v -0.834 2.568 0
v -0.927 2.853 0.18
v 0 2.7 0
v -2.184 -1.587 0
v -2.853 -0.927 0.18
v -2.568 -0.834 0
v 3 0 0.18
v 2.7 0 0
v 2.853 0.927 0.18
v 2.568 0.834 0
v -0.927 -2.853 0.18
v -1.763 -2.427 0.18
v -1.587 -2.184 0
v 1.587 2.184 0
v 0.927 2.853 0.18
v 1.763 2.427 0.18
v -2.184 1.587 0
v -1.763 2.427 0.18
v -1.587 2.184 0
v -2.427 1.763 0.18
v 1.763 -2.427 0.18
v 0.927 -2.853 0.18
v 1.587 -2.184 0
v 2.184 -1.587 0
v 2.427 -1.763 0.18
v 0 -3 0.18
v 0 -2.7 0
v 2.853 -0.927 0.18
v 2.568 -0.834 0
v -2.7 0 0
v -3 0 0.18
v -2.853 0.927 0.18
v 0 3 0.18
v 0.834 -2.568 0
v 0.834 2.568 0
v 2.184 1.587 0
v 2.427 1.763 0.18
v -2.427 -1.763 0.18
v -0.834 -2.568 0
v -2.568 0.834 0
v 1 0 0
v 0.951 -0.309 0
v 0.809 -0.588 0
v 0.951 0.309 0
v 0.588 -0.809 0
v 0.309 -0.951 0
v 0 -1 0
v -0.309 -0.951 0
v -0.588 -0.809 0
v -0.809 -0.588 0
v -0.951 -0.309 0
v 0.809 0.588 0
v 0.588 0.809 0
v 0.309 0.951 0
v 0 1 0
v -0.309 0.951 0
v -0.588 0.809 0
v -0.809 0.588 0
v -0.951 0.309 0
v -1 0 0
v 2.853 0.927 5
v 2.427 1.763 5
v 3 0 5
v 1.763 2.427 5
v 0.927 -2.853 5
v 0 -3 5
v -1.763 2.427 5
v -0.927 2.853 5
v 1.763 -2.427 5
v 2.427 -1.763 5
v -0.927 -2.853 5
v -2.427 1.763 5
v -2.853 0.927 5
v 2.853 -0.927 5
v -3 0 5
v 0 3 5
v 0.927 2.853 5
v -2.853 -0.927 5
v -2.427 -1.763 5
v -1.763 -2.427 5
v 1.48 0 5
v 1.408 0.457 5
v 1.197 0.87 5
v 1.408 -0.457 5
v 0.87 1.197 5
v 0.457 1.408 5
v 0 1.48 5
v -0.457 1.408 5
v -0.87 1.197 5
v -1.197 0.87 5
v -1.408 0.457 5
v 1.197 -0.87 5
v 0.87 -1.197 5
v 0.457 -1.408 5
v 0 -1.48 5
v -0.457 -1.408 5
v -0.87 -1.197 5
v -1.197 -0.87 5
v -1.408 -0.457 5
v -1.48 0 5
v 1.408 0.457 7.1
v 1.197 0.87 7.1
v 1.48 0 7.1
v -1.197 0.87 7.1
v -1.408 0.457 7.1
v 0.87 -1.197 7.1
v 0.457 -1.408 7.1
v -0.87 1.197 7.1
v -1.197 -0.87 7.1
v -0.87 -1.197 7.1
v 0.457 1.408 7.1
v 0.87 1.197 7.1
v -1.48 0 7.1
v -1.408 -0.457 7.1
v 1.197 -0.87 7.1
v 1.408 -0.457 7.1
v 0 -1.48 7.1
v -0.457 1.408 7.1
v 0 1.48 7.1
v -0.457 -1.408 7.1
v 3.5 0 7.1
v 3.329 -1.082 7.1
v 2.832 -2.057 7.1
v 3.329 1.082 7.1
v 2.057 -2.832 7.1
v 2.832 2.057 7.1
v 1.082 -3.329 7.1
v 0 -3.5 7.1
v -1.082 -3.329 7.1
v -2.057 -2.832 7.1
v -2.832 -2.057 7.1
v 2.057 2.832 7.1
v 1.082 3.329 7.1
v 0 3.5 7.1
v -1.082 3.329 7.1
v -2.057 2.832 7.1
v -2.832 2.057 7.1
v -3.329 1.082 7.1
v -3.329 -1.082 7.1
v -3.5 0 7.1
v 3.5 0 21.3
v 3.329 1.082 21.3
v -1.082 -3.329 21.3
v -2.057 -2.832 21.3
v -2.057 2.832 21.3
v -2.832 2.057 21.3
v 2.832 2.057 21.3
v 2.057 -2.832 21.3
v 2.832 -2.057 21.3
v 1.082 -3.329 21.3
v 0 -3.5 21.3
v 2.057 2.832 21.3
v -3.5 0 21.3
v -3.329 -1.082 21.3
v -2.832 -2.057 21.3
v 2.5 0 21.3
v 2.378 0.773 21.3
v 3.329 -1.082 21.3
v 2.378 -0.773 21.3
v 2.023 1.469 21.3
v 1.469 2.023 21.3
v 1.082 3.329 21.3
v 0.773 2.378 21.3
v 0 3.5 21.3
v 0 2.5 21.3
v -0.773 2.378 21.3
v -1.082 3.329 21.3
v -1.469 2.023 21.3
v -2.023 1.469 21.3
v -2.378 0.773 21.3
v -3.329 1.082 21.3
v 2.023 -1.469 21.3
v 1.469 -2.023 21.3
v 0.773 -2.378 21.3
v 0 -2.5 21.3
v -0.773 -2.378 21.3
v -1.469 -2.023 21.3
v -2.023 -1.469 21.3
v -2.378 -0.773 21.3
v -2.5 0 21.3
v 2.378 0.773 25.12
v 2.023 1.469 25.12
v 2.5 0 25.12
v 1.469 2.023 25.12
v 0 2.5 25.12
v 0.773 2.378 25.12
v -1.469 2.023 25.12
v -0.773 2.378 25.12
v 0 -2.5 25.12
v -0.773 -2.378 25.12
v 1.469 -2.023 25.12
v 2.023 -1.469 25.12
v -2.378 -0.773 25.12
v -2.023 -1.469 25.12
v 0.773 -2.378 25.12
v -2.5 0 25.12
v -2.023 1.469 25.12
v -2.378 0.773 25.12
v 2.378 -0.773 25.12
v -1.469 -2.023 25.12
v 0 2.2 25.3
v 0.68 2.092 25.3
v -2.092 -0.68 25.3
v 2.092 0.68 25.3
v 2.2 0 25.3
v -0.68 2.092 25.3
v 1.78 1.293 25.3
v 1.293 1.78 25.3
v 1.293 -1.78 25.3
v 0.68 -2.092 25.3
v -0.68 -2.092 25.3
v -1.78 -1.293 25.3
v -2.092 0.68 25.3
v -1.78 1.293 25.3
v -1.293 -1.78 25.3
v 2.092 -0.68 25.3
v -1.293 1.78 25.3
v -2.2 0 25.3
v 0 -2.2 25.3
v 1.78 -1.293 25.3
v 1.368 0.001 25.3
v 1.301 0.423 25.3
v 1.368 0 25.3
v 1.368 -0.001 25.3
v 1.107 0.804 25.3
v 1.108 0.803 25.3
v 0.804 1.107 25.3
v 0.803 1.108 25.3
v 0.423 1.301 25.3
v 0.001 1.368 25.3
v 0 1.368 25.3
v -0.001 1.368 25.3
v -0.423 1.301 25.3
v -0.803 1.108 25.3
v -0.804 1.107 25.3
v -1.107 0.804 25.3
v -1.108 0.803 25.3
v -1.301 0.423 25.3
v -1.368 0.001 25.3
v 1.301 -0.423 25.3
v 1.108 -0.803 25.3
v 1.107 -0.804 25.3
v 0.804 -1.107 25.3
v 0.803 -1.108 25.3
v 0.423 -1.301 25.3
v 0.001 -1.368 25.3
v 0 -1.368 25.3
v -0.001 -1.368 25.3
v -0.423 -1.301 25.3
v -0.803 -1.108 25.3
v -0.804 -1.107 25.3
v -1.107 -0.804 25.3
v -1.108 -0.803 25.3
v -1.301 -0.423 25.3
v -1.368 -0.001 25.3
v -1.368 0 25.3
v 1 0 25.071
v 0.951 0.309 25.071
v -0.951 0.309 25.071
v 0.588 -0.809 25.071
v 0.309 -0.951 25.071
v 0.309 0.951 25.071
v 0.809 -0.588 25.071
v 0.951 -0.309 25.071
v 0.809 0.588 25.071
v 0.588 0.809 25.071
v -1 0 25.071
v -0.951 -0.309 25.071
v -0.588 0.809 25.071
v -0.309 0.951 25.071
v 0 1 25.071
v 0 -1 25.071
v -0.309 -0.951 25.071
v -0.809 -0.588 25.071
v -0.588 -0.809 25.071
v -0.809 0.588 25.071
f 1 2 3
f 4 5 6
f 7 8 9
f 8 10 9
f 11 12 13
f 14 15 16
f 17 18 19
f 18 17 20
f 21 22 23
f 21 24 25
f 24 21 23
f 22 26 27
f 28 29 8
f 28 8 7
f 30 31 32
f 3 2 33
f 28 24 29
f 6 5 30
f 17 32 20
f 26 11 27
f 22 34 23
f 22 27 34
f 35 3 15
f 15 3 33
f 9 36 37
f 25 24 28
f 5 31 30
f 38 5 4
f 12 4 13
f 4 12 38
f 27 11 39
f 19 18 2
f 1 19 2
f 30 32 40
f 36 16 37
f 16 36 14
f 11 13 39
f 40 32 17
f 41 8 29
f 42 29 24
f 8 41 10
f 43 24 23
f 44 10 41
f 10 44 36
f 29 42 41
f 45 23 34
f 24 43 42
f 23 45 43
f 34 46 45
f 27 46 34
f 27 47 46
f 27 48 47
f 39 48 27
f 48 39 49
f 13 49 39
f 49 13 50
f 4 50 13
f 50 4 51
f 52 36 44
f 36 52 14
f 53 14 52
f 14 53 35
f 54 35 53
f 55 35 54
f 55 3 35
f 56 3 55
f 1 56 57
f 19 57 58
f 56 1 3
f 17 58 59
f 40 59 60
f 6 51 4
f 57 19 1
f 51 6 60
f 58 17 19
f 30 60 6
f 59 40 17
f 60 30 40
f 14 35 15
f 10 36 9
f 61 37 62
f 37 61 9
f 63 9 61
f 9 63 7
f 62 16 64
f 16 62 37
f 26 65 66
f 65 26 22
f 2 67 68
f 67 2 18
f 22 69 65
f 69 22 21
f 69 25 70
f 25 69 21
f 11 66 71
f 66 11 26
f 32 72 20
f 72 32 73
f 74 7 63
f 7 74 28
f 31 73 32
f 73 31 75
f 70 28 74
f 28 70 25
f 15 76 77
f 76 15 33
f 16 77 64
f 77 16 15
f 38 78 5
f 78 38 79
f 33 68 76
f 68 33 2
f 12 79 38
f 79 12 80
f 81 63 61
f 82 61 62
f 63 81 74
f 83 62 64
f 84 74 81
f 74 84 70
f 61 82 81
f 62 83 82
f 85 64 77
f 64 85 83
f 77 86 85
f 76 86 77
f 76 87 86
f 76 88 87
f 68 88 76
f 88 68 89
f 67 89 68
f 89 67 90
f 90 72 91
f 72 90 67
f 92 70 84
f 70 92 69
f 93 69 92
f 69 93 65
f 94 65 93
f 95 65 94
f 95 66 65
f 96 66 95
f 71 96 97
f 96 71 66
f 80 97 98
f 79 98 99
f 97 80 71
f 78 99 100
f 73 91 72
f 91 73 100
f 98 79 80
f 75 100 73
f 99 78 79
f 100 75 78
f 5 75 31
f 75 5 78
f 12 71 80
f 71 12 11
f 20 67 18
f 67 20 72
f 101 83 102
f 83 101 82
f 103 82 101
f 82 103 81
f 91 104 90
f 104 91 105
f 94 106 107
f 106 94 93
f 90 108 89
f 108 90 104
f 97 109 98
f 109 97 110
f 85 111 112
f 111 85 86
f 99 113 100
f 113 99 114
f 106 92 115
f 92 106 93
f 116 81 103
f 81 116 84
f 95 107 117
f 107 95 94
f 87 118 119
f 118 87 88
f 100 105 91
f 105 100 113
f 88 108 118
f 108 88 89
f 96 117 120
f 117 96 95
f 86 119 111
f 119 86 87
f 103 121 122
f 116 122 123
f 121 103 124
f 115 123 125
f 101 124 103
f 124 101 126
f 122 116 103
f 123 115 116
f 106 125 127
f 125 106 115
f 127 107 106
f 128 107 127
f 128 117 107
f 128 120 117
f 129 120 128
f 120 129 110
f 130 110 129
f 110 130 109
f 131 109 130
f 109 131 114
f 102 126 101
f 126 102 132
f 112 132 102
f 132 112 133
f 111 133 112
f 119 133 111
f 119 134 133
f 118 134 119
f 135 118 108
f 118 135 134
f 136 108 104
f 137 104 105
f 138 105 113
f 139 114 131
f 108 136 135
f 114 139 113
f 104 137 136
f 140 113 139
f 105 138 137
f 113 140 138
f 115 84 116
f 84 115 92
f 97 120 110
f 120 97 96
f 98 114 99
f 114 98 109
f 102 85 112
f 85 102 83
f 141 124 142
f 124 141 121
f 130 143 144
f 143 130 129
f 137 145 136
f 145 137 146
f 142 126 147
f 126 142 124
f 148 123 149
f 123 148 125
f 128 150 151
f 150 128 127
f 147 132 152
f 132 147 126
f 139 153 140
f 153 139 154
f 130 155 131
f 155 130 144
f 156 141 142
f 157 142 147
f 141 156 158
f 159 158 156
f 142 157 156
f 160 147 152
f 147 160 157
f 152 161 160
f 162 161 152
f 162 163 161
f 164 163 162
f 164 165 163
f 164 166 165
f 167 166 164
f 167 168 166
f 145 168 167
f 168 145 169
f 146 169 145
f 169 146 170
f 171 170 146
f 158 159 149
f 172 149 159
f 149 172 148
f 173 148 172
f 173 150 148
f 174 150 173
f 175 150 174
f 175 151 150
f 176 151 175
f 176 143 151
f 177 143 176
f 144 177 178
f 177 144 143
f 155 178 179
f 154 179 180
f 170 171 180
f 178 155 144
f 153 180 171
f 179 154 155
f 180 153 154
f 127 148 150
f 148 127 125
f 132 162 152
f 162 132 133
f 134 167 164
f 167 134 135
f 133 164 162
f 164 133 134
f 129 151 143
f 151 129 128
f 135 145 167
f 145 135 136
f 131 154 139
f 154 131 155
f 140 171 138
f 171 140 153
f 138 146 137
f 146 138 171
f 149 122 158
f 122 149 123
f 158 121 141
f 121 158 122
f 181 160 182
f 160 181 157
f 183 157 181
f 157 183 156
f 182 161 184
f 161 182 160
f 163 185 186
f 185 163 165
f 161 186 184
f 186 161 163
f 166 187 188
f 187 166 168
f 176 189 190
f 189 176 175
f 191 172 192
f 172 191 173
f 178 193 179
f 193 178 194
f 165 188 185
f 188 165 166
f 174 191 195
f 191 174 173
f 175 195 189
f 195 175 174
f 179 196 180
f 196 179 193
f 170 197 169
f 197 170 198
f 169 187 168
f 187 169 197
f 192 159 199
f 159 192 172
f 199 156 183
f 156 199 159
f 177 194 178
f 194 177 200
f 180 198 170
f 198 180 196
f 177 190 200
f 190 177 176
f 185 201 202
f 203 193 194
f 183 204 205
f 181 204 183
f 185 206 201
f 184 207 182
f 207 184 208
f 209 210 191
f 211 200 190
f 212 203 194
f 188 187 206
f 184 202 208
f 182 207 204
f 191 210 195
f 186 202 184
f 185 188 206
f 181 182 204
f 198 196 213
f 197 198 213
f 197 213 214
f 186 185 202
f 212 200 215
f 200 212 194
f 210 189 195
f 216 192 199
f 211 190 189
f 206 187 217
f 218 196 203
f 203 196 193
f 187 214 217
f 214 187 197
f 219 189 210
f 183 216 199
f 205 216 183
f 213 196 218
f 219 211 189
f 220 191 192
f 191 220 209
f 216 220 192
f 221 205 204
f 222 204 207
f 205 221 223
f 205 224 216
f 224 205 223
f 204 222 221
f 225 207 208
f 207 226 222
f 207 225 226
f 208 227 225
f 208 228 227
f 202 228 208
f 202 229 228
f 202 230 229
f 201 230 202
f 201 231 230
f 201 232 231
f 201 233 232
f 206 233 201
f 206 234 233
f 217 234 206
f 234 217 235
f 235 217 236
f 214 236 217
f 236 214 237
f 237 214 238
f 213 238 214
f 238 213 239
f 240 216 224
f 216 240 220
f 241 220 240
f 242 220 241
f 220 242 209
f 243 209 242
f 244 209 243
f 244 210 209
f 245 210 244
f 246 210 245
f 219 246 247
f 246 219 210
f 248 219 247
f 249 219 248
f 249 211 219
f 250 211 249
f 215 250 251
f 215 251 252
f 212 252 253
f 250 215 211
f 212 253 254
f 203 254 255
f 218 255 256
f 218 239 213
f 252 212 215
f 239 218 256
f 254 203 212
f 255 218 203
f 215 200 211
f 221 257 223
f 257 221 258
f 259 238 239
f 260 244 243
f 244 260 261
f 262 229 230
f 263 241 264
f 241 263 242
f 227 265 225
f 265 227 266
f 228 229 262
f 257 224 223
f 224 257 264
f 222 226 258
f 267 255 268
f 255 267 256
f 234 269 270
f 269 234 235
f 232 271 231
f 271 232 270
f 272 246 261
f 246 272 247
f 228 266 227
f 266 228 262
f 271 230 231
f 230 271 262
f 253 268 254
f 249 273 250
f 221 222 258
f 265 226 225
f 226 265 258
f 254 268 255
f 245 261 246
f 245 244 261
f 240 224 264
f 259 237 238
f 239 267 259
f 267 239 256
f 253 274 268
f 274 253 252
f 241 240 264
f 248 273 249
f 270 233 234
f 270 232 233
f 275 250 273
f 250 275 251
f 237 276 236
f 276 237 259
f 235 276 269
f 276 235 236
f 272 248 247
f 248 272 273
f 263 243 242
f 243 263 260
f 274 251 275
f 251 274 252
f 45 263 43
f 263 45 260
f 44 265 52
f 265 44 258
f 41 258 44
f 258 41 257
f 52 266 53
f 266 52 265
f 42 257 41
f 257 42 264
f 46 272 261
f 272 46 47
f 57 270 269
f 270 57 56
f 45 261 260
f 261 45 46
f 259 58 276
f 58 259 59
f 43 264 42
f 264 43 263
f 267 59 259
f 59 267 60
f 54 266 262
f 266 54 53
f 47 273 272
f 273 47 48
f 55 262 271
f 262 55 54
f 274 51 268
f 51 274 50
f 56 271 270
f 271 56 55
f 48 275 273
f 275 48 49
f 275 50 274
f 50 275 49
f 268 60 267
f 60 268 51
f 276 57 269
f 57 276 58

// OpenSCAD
$fn=20;

E3DV6();

fudge=0.1;

module E3DV6(){
  blockOffset=-13.5;
  nozzleOffset=-6;
  heatBreakOffset=-7;
  color("silver") V6HeatSink();
  color("silver") translate([0,0,blockOffset]) V6Block();
  color("gold") translate([0,0,blockOffset+nozzleOffset]) V6Nozzle();
  color("grey") translate([0,0,heatBreakOffset]) V6HeatBreak();
}

module V6HeatSink(){
  ovHght=42.7;
  
  difference(){
    body();
    translate([0,0,-fudge]){
     cylinder(d=6,h=15.1+fudge);
     cylinder(d=7,h=10+fudge);
     cylinder(d=4.2,h=ovHght+fudge*2);
    }
    translate([0,0,ovHght-6.5+fudge]) cylinder(d=8,h=6.5+fudge);
  }
  
  module body(){
    //fins
    cylinder(d=22.3,h=1);
    for (iz=[1:10])
      translate([0,0,iz*2.5]) cylinder(d=22,h=1);
    translate([0,0,11*2.5]) cylinder(d=16,h=1);
    
    //mount
    translate([0,0,ovHght-3.7]) cylinder(d=16,h=3.7);
    translate([0,0,ovHght-3.7-6]) cylinder(d=12,h=6);
    translate([0,0,ovHght-3.7-6-3]) cylinder(d=16,h=3);
    
    //core
    cylinder(d1=10,d2=8,h=30);
  }
}

*V6Block();
module V6Block(){
  dims=[23,16,11.5];
  blockOffset=[-dims.x+8,-8,0];
  translate(blockOffset) difference(){
    cube(dims);
    translate([dims.x-20.5,8,-fudge/2]) cylinder(d=3,h=dims.z+fudge);
    translate([dims.x-2,8,-fudge/2]) cylinder(d=3,h=5.75);
    translate([dims.x-8,8,-fudge/2]) cylinder(d=6,h=dims.z+fudge);
    translate([dims.x-14.5,-fudge/2,4]) rotate([-90,0,0]) cylinder(d=6,h=dims.y+fudge);
    translate([-fudge/2,-fudge/2,4-0.5]) cube([dims.x-14.5+fudge,dims.y+fudge,1]);
  }
}

*V6Nozzle();
module V6Nozzle(){
  //Nozzle for 1.75mm filament
  E=2.6; //top opening
  D=2.0;
  ovHght=12.5;
  translate([0,0,ovHght-6]) cylinder(d=6,h=6);
  translate([0,0,ovHght-7.5]) cylinder(d=5,h=1.5);
  translate([0,0,ovHght-10.5]) cylinder(d=7/0.866,h=3,$fn=6);
  cylinder(d1=1,d2=5,h=2);
}

!V6HeatBreak();
module V6HeatBreak(){
  chmfrOut=[0.3,0.18];
  chmfrIn=[0.37,0.23];
  cntrBore=2;
  
  
  difference() {
    union(){
      cylinder(d1=6-chmfrOut.x*2,d2=6,h=chmfrOut.y);
      translate([0,0,chmfrOut.y]) cylinder(d=6,h=5-chmfrOut.y); //M6
      translate([0,0,5]) cylinder(d=cntrBore+0.48*2,h=2.1);
      translate([0,0,5+2.1]) cylinder(d=7,h=14.2); //M7
      translate([0,0,5+2.1+14.2]) cylinder(d=5,h=4-chmfrOut.y); //M6
      translate([0,0,5+2.1+14.2+4-chmfrOut.y]) 
        cylinder(d1=5,d2=5-chmfrOut.x*2,h=chmfrOut.y);
    }
    translate([0,0,5+2.1+14.2+4-chmfrIn.y+0.001]) cylinder(d1=cntrBore,d2=cntrBore+chmfrIn.x*2,h=chmfrIn.y);
    translate([0,0,-fudge/2]) cylinder(d=cntrBore,h=25.3+fudge);
  }
}
